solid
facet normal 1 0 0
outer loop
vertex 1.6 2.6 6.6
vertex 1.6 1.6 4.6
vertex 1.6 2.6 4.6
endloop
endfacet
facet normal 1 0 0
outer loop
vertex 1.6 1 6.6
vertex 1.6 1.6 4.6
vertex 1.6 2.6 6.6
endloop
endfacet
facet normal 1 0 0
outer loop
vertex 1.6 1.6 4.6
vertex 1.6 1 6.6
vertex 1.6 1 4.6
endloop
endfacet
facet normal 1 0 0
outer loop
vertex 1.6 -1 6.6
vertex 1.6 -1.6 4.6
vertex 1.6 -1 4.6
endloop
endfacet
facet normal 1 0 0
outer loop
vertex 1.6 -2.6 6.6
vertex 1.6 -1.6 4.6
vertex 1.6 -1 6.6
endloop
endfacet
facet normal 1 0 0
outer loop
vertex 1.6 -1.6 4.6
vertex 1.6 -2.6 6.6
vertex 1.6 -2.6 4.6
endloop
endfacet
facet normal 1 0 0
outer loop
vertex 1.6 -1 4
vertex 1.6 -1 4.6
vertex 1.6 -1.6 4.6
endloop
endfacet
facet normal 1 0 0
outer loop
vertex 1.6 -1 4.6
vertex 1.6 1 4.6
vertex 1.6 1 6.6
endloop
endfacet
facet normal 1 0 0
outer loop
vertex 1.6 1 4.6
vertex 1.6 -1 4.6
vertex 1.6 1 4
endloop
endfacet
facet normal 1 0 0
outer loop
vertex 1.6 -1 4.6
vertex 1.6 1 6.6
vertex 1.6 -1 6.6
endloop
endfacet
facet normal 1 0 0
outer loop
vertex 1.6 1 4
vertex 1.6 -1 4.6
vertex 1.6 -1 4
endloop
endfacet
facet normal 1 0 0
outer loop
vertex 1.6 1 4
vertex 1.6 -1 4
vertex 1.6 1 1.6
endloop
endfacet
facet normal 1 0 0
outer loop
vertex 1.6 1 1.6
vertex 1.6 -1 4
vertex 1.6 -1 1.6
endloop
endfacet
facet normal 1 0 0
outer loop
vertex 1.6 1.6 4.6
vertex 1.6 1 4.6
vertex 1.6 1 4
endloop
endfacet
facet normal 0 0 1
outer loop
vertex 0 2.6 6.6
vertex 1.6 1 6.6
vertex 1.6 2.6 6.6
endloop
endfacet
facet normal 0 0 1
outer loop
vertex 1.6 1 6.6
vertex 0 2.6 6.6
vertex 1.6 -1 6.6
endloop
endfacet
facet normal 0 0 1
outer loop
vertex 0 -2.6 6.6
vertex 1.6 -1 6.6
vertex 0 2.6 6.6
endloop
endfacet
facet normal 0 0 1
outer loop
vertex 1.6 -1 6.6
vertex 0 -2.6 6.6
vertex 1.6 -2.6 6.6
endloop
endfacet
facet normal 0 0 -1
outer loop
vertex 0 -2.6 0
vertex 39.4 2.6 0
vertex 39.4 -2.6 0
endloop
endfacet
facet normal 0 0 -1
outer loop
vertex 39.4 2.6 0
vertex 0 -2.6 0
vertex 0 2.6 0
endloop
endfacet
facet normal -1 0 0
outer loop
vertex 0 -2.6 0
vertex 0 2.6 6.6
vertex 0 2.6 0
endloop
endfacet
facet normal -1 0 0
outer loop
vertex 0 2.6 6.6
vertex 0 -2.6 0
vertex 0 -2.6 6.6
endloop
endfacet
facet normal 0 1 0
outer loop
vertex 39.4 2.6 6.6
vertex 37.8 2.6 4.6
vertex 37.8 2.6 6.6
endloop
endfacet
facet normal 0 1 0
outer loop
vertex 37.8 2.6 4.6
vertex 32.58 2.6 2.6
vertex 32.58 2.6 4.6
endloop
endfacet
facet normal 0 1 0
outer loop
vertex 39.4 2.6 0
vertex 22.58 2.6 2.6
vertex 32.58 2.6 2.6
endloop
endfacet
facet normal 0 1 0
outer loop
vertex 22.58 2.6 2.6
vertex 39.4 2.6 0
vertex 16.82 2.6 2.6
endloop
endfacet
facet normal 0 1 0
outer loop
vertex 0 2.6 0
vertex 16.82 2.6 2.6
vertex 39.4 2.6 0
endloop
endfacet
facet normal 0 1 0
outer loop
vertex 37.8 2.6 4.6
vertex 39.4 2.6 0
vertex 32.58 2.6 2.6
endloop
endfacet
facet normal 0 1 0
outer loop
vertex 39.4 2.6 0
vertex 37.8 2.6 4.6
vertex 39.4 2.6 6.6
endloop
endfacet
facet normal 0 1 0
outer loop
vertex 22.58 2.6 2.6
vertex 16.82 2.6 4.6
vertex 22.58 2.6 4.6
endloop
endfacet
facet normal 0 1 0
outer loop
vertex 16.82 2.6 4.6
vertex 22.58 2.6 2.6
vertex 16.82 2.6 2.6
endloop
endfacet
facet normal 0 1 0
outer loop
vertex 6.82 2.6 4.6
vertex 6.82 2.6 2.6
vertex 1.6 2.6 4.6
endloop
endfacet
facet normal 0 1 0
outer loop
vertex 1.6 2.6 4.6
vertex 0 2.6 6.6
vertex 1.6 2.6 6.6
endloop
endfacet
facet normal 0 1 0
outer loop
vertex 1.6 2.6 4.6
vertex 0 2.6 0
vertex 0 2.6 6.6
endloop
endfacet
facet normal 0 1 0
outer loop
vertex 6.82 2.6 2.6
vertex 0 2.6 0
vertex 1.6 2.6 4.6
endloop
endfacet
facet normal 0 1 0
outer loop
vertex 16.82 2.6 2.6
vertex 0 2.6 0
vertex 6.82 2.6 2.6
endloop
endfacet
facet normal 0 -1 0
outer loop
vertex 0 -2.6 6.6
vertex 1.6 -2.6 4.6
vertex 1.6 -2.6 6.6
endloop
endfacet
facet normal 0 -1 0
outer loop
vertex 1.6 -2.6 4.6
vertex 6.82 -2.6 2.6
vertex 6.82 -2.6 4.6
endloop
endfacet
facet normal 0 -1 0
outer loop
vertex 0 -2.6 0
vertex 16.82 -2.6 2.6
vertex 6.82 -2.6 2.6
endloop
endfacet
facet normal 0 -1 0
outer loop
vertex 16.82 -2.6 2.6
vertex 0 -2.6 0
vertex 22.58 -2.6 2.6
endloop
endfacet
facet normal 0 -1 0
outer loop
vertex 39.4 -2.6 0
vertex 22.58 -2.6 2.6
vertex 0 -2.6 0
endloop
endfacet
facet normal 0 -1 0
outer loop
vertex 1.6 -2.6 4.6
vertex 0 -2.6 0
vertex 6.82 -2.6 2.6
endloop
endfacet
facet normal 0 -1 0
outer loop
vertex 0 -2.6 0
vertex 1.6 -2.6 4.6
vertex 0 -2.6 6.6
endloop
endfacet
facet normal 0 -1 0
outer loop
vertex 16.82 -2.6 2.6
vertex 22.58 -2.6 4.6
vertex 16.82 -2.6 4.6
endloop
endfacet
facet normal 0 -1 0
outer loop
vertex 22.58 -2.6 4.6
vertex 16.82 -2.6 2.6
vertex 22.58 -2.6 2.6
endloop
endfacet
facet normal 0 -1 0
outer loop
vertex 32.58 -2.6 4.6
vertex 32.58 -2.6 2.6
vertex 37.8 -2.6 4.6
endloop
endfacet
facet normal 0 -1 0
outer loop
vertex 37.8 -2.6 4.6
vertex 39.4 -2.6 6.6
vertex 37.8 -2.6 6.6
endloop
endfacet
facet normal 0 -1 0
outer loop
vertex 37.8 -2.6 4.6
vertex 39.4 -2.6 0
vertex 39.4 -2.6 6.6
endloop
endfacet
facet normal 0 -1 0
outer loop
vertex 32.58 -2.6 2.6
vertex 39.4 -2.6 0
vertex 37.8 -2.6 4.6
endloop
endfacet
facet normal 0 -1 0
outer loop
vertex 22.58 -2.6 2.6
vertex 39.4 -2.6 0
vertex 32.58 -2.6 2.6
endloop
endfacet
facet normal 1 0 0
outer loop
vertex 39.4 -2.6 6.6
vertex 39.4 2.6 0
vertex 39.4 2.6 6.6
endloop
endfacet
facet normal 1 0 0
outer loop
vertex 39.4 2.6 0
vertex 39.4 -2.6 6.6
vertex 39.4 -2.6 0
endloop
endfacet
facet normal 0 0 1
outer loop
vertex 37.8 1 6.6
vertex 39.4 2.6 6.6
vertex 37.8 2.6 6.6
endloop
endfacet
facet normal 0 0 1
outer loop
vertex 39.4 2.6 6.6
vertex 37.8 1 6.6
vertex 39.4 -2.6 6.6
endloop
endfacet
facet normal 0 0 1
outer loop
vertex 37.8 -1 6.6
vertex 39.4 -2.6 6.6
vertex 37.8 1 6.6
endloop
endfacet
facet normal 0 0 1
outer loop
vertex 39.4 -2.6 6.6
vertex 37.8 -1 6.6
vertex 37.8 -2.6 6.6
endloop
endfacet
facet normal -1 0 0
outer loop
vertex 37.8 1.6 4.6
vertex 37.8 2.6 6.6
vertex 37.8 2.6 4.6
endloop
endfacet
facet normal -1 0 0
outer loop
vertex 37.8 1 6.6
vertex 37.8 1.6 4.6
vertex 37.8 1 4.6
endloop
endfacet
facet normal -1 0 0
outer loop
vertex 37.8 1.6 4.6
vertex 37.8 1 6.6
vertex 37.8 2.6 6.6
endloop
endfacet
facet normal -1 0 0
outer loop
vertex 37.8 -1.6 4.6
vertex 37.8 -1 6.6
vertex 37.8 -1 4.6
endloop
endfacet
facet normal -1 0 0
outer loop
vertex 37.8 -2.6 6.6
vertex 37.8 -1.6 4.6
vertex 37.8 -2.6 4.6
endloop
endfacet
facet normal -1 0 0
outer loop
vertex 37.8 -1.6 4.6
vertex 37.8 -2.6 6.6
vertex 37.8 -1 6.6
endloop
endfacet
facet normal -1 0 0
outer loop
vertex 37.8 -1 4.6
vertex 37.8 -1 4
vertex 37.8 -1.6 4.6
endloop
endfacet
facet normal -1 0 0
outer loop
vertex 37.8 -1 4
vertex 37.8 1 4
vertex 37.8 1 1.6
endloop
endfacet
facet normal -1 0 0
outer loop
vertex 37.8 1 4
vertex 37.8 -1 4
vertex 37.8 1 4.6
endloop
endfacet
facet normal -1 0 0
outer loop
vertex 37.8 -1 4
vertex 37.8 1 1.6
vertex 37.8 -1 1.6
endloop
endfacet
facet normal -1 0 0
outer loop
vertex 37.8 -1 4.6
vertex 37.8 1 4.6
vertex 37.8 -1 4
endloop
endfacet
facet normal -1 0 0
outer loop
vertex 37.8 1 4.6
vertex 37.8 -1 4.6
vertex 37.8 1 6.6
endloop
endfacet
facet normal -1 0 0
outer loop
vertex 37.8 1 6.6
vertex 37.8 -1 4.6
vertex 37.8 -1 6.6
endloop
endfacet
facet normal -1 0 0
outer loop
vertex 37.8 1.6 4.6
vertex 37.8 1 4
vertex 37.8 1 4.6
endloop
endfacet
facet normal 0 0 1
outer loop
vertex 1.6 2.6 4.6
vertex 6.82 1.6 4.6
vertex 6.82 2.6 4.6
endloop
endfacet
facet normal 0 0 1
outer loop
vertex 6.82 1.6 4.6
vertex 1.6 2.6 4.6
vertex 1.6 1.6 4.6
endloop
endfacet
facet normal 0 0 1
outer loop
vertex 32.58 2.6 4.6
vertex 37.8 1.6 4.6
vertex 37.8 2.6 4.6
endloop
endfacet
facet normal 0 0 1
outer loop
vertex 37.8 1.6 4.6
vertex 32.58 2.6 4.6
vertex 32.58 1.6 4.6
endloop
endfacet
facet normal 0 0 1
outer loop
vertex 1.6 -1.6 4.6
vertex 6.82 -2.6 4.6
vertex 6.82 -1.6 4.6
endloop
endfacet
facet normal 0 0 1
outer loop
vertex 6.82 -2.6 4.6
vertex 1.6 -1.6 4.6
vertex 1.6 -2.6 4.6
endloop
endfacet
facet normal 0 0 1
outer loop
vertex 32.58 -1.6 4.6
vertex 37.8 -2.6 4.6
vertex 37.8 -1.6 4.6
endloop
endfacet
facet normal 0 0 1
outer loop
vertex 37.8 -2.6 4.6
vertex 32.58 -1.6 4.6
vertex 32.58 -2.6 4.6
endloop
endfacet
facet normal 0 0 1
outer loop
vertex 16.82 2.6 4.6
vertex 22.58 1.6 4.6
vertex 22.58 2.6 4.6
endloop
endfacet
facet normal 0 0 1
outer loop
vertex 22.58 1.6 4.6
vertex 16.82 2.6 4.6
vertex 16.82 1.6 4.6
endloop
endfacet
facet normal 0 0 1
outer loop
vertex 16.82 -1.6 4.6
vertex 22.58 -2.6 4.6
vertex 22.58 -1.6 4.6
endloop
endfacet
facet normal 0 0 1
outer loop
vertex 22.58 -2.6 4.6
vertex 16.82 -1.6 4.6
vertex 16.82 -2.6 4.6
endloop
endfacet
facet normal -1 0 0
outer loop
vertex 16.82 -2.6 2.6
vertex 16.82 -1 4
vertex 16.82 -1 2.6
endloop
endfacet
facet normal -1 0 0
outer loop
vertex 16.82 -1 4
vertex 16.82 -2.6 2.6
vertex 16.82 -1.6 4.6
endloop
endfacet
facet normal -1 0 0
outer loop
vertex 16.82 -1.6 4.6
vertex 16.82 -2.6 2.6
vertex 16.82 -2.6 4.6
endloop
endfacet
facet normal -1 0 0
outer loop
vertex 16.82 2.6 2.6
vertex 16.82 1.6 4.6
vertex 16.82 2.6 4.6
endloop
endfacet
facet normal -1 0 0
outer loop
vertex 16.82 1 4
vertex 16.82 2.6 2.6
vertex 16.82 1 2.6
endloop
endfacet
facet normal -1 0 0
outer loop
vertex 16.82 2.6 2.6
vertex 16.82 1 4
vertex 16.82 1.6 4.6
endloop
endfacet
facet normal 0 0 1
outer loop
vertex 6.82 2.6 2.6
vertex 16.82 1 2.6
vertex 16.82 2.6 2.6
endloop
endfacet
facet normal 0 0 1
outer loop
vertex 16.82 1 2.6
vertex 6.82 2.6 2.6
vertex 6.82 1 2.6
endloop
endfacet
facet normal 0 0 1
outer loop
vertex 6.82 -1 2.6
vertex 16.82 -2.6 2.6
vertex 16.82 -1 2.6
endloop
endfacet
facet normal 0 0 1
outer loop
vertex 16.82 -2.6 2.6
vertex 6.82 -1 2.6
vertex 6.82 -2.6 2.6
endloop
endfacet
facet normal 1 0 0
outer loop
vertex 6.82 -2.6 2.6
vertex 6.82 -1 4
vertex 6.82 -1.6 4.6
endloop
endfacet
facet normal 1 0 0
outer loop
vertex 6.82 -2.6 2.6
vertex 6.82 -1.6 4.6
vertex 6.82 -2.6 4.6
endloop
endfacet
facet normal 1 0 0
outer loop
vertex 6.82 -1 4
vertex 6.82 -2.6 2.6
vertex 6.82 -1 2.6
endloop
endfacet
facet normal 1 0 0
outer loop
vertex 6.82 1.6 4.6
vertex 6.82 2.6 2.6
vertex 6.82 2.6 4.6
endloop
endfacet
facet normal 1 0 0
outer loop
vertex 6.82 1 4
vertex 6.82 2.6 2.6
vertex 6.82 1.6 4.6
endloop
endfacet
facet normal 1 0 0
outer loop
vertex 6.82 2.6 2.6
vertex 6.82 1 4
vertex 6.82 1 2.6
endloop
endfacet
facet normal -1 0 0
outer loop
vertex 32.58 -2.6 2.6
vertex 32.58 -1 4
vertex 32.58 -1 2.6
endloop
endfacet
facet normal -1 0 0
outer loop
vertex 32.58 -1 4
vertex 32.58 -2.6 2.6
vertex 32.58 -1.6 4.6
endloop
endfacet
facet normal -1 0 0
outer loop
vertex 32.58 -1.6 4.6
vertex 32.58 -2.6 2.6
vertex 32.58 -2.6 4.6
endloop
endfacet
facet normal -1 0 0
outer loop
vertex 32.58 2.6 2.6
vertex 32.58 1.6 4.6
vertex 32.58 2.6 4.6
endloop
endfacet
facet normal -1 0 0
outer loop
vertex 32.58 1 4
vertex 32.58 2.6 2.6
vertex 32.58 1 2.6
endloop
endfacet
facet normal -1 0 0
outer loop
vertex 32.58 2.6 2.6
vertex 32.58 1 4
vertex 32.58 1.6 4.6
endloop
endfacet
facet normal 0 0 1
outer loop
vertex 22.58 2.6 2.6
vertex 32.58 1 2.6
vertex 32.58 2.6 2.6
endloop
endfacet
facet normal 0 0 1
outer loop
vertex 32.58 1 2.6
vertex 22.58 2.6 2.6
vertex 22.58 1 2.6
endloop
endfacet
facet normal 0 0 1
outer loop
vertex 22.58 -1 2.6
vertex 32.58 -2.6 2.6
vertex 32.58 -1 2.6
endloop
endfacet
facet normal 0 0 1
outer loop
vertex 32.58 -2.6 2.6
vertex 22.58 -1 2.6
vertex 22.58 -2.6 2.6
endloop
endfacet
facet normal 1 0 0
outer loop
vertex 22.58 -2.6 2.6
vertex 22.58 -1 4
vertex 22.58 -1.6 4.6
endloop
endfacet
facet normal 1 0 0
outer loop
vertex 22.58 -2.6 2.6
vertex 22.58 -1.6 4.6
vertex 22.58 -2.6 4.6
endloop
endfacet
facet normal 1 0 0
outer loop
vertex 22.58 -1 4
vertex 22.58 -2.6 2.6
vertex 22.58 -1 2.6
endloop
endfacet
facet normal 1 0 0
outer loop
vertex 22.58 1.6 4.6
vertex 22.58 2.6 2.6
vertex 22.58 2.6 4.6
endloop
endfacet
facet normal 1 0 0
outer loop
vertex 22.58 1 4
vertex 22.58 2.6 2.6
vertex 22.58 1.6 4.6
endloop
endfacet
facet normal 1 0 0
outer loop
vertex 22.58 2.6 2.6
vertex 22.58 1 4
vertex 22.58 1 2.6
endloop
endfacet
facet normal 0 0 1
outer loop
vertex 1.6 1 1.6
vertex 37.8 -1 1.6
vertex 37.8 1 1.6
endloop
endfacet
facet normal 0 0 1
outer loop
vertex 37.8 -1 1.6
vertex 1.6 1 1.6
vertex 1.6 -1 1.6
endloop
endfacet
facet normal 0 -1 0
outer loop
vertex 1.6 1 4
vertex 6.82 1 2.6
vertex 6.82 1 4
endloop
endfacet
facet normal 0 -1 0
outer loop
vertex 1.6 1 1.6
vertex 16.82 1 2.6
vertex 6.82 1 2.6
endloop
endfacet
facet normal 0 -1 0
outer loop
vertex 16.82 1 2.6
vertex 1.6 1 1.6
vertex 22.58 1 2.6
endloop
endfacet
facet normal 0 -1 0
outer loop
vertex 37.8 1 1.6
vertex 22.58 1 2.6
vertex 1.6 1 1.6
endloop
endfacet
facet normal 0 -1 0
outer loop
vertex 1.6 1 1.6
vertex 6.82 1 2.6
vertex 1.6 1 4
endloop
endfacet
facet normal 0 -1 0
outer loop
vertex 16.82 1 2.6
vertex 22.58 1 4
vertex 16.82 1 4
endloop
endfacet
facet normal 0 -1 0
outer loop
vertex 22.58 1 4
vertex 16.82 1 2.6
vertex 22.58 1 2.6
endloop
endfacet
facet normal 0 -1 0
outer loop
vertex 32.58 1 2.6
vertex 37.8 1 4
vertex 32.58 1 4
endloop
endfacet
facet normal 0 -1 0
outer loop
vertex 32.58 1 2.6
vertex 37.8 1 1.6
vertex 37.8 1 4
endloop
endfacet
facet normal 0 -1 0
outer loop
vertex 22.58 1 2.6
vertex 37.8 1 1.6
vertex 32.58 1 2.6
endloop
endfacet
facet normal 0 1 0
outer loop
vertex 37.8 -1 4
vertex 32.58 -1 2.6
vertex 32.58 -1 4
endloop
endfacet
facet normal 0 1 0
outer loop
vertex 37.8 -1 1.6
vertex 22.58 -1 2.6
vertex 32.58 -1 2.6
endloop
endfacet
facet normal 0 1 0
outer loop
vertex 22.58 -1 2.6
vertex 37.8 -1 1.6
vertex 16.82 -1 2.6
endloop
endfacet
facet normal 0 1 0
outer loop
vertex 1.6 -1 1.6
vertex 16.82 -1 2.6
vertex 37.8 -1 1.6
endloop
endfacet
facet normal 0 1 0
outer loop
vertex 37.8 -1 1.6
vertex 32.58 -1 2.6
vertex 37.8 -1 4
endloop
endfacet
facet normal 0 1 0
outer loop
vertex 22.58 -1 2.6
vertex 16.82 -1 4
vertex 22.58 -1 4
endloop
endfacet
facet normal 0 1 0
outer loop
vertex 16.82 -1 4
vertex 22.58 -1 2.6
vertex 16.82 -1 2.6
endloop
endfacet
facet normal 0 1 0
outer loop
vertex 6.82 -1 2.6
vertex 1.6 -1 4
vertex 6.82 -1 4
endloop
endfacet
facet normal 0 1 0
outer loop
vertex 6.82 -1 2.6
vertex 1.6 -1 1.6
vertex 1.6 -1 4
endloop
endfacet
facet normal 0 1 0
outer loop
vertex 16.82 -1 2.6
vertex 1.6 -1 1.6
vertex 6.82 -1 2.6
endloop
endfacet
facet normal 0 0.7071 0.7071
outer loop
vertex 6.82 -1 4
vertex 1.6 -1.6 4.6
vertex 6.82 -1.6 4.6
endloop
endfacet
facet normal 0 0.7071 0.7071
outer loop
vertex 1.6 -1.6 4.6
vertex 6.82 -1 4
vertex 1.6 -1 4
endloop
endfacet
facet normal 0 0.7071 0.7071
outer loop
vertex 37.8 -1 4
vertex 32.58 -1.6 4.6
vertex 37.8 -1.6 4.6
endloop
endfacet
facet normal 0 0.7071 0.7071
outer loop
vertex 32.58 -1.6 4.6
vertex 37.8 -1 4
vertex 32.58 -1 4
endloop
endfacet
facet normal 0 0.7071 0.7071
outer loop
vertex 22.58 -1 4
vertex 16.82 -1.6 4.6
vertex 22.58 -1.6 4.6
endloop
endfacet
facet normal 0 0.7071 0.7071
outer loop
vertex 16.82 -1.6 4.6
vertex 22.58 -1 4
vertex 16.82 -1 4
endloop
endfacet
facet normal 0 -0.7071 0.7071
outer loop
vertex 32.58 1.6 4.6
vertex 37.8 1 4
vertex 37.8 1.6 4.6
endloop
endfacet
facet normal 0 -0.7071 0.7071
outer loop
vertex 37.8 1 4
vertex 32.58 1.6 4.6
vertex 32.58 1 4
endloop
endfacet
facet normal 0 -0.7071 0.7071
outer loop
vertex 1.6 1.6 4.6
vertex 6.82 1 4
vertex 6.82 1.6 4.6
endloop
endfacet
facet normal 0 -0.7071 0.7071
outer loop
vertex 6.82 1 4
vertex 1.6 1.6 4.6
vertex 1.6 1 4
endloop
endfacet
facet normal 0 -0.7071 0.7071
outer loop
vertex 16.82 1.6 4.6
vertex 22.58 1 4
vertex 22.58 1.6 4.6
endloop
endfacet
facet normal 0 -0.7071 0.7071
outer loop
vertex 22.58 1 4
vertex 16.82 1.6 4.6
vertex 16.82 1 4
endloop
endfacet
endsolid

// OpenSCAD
// =====================================================================
// esp_tray.scad — two ways to hold an MH-ET D1-Mini ESP32
// =====================================================================
//
//  Study: ../10_assembly_architecture/AA_electronics_placement_study.md §5
//
//  variant = "shoe"  the on-edge carrier that goes in the car
//  variant = "bench" a flat desk tray that does NOT go in the car
//
//  ---------------------------------------------------------------------
//  Why two, and why the flat one is not a vehicle part
//  ---------------------------------------------------------------------
//  Laid flat, a D1-Mini needs 31 mm of lateral band. The only band the car
//  has between the steering keep-out and the shell shoulder is 13 mm wide
//  (AA §5.2), and pushing outboard to |L| 50 meets shell ceilings of 7-9 mm.
//  That is why the flat mezzanine (SF-B) was rejected and the boards stand
//  on edge. The "bench" variant below exists for flashing and bring-up on
//  a desk, where none of that applies -- and it is the only place in this
//  repo where a PCB's own mounting holes are used, because on a desk
//  locating the board IS the whole job.
//
//  ---------------------------------------------------------------------
//  The shoe, and what it buys
//  ---------------------------------------------------------------------
//  The cage grips the bare PCB directly. That works, but every service
//  cycle then abrades the board's own edge. The shoe is a sacrificial
//  U-channel that the board lives in permanently: the shoe wears, not the
//  ESP32, and a worn shoe is a 20-minute reprint.
//
//  It is a DRAFT. esp_len / esp_wid / esp_pcb_t are DOCUMENTED for the SKU
//  class, not measured on our board (M-03), and the shoe's own thickness
//  eats the board band, which is exactly 13 mm wide with nothing spare.
//  Coupon C-3 with a real board decides whether the shoe is affordable at
//  all -- if it is not, the cage grips the bare PCB and this file stays a
//  bench tray.
// =====================================================================

include <w17_params.scad>
include <lib/w17_lib.scad>

variant = "shoe";     // "shoe" | "bench"

shoe_t      = 1.6;    // ESTIMATED(4 perimeters; it is a wear part, not a structural one)
shoe_grip   = 3.0;    // ESTIMATED(how far the channel comes up the board's face)
bench_h     = 6.0;    // ESTIMATED(standoff height: clears the board's underside pins)
bench_wall  = 2.0;    // ESTIMATED
bench_lip   = 3.0;    // ESTIMATED(a rim, so the tray does not slide off a desk edge)


// ---------------------------------------------------------------------
//  The on-edge shoe
// ---------------------------------------------------------------------
module esp_shoe() {
    // A U-channel in section: the board's bottom long edge sits in it.
    // Built lying along X with the channel opening upward, at the origin,
    // so it can be printed flat -- which puts the print layers ACROSS the
    // load path, the rule K_printable_support_spec.md applies everywhere.
    ch_w  = esp_pcb_t + 2*fit_clearance;
    out_w = ch_w + 2*shoe_t;
    len   = esp_len + 2*fit_clearance;

    difference() {
        union() {
            // channel body
            translate([0, -out_w/2, 0]) cube([len, out_w, shoe_t + shoe_grip]);
            // end stops, so the board cannot slide out lengthwise
            for (sx = [0, len - shoe_t])
                translate([sx, -out_w/2, 0])
                    cube([shoe_t, out_w, shoe_t + shoe_grip + 2]);
        }
        // the channel the PCB sits in
        translate([shoe_t, -ch_w/2, shoe_t])
            cube([len - 2*shoe_t, ch_w, shoe_grip + EPS + 2]);
        // chamfered mouth, so the board finds it blind
        translate([shoe_t, 0, shoe_t + shoe_grip])
            w17_slot_lead_in(len - 2*shoe_t, ch_w, slot_lead_in);
        // a relief window per side, so the shoe cannot trap a component
        // that sits low on the board's edge -- and so you can see the board
        for (sx = [len*0.30, len*0.70])
            translate([sx - 5, -out_w/2 - EPS, shoe_t + 1])
                cube([10, out_w + 2*EPS, shoe_grip]);
    }
}


// ---------------------------------------------------------------------
//  The bench tray (desk only -- never in the car)
// ---------------------------------------------------------------------
module esp_bench_tray() {
    plate_l = esp_len + 2*bench_wall + 2*bench_lip;
    plate_w = esp_wid + 2*bench_wall + 2*bench_lip;

    difference() {
        union() {
            // base plate with chamfered corners
            w17_chamfered_box([plate_l, plate_w, bench_wall], 2.5);
            // four standoffs on the board's hole pattern
            translate([plate_l/2, 0, bench_wall])
                w17_standoff_pattern(esp_hole_dx, esp_hole_dy,
                                     bench_h, esp_hole_d + 3.0, 0);
            // a low rim
            difference() {
                w17_chamfered_box([plate_l, plate_w, bench_wall + bench_lip], 2.5);
                translate([bench_wall, -(plate_w/2 - bench_wall), bench_wall])
                    cube([plate_l - 2*bench_wall, plate_w - 2*bench_wall,
                          bench_lip + EPS]);
            }
        }
        // locating pips: shallow blind holes in the standoff tops.
        // NOTE the study forbids LOADING a PCB's own holes in the car
        // (AA §5.6). On a desk, locating the board is the entire job, so
        // this is the one place they are used -- and only as a locator,
        // never with a screw pulled down through them.
        translate([plate_l/2, 0, bench_wall + bench_h - 2.5])
            w17_board_holes(esp_hole_dx, esp_hole_dy,
                            esp_hole_d - 2*fit_clearance, 2.5);
        // USB-C access notch through the rim, on the +X short edge
        translate([plate_l - bench_wall - EPS,
                   esp_usb_offset,
                   bench_wall + bench_h - esp_usb_h/2])
            w17_usb_notch(esp_usb_w, esp_usb_h, bench_wall + 2*EPS, fit_clearance + 1);
        // cable-tie pair, so a USB lead is strain-relieved on the desk
        translate([bench_lip + 4, 0, 0])
            w17_zip_slot_pair(zip_slot_w, zip_slot_l, zip_slot_bridge, bench_wall);
    }
}


// ---------------------------------------------------------------------
if (variant == "shoe") {
    esp_shoe();
} else if (variant == "bench") {
    esp_bench_tray();
} else {
    assert(false, "variant must be shoe | bench");
}

echo(str("[esp_tray] variant=", variant,
         " | board ", esp_len, " x ", esp_wid, " x ", esp_pcb_t,
         " (DOCUMENTED for the SKU class, NOT measured -- M-03)"));
